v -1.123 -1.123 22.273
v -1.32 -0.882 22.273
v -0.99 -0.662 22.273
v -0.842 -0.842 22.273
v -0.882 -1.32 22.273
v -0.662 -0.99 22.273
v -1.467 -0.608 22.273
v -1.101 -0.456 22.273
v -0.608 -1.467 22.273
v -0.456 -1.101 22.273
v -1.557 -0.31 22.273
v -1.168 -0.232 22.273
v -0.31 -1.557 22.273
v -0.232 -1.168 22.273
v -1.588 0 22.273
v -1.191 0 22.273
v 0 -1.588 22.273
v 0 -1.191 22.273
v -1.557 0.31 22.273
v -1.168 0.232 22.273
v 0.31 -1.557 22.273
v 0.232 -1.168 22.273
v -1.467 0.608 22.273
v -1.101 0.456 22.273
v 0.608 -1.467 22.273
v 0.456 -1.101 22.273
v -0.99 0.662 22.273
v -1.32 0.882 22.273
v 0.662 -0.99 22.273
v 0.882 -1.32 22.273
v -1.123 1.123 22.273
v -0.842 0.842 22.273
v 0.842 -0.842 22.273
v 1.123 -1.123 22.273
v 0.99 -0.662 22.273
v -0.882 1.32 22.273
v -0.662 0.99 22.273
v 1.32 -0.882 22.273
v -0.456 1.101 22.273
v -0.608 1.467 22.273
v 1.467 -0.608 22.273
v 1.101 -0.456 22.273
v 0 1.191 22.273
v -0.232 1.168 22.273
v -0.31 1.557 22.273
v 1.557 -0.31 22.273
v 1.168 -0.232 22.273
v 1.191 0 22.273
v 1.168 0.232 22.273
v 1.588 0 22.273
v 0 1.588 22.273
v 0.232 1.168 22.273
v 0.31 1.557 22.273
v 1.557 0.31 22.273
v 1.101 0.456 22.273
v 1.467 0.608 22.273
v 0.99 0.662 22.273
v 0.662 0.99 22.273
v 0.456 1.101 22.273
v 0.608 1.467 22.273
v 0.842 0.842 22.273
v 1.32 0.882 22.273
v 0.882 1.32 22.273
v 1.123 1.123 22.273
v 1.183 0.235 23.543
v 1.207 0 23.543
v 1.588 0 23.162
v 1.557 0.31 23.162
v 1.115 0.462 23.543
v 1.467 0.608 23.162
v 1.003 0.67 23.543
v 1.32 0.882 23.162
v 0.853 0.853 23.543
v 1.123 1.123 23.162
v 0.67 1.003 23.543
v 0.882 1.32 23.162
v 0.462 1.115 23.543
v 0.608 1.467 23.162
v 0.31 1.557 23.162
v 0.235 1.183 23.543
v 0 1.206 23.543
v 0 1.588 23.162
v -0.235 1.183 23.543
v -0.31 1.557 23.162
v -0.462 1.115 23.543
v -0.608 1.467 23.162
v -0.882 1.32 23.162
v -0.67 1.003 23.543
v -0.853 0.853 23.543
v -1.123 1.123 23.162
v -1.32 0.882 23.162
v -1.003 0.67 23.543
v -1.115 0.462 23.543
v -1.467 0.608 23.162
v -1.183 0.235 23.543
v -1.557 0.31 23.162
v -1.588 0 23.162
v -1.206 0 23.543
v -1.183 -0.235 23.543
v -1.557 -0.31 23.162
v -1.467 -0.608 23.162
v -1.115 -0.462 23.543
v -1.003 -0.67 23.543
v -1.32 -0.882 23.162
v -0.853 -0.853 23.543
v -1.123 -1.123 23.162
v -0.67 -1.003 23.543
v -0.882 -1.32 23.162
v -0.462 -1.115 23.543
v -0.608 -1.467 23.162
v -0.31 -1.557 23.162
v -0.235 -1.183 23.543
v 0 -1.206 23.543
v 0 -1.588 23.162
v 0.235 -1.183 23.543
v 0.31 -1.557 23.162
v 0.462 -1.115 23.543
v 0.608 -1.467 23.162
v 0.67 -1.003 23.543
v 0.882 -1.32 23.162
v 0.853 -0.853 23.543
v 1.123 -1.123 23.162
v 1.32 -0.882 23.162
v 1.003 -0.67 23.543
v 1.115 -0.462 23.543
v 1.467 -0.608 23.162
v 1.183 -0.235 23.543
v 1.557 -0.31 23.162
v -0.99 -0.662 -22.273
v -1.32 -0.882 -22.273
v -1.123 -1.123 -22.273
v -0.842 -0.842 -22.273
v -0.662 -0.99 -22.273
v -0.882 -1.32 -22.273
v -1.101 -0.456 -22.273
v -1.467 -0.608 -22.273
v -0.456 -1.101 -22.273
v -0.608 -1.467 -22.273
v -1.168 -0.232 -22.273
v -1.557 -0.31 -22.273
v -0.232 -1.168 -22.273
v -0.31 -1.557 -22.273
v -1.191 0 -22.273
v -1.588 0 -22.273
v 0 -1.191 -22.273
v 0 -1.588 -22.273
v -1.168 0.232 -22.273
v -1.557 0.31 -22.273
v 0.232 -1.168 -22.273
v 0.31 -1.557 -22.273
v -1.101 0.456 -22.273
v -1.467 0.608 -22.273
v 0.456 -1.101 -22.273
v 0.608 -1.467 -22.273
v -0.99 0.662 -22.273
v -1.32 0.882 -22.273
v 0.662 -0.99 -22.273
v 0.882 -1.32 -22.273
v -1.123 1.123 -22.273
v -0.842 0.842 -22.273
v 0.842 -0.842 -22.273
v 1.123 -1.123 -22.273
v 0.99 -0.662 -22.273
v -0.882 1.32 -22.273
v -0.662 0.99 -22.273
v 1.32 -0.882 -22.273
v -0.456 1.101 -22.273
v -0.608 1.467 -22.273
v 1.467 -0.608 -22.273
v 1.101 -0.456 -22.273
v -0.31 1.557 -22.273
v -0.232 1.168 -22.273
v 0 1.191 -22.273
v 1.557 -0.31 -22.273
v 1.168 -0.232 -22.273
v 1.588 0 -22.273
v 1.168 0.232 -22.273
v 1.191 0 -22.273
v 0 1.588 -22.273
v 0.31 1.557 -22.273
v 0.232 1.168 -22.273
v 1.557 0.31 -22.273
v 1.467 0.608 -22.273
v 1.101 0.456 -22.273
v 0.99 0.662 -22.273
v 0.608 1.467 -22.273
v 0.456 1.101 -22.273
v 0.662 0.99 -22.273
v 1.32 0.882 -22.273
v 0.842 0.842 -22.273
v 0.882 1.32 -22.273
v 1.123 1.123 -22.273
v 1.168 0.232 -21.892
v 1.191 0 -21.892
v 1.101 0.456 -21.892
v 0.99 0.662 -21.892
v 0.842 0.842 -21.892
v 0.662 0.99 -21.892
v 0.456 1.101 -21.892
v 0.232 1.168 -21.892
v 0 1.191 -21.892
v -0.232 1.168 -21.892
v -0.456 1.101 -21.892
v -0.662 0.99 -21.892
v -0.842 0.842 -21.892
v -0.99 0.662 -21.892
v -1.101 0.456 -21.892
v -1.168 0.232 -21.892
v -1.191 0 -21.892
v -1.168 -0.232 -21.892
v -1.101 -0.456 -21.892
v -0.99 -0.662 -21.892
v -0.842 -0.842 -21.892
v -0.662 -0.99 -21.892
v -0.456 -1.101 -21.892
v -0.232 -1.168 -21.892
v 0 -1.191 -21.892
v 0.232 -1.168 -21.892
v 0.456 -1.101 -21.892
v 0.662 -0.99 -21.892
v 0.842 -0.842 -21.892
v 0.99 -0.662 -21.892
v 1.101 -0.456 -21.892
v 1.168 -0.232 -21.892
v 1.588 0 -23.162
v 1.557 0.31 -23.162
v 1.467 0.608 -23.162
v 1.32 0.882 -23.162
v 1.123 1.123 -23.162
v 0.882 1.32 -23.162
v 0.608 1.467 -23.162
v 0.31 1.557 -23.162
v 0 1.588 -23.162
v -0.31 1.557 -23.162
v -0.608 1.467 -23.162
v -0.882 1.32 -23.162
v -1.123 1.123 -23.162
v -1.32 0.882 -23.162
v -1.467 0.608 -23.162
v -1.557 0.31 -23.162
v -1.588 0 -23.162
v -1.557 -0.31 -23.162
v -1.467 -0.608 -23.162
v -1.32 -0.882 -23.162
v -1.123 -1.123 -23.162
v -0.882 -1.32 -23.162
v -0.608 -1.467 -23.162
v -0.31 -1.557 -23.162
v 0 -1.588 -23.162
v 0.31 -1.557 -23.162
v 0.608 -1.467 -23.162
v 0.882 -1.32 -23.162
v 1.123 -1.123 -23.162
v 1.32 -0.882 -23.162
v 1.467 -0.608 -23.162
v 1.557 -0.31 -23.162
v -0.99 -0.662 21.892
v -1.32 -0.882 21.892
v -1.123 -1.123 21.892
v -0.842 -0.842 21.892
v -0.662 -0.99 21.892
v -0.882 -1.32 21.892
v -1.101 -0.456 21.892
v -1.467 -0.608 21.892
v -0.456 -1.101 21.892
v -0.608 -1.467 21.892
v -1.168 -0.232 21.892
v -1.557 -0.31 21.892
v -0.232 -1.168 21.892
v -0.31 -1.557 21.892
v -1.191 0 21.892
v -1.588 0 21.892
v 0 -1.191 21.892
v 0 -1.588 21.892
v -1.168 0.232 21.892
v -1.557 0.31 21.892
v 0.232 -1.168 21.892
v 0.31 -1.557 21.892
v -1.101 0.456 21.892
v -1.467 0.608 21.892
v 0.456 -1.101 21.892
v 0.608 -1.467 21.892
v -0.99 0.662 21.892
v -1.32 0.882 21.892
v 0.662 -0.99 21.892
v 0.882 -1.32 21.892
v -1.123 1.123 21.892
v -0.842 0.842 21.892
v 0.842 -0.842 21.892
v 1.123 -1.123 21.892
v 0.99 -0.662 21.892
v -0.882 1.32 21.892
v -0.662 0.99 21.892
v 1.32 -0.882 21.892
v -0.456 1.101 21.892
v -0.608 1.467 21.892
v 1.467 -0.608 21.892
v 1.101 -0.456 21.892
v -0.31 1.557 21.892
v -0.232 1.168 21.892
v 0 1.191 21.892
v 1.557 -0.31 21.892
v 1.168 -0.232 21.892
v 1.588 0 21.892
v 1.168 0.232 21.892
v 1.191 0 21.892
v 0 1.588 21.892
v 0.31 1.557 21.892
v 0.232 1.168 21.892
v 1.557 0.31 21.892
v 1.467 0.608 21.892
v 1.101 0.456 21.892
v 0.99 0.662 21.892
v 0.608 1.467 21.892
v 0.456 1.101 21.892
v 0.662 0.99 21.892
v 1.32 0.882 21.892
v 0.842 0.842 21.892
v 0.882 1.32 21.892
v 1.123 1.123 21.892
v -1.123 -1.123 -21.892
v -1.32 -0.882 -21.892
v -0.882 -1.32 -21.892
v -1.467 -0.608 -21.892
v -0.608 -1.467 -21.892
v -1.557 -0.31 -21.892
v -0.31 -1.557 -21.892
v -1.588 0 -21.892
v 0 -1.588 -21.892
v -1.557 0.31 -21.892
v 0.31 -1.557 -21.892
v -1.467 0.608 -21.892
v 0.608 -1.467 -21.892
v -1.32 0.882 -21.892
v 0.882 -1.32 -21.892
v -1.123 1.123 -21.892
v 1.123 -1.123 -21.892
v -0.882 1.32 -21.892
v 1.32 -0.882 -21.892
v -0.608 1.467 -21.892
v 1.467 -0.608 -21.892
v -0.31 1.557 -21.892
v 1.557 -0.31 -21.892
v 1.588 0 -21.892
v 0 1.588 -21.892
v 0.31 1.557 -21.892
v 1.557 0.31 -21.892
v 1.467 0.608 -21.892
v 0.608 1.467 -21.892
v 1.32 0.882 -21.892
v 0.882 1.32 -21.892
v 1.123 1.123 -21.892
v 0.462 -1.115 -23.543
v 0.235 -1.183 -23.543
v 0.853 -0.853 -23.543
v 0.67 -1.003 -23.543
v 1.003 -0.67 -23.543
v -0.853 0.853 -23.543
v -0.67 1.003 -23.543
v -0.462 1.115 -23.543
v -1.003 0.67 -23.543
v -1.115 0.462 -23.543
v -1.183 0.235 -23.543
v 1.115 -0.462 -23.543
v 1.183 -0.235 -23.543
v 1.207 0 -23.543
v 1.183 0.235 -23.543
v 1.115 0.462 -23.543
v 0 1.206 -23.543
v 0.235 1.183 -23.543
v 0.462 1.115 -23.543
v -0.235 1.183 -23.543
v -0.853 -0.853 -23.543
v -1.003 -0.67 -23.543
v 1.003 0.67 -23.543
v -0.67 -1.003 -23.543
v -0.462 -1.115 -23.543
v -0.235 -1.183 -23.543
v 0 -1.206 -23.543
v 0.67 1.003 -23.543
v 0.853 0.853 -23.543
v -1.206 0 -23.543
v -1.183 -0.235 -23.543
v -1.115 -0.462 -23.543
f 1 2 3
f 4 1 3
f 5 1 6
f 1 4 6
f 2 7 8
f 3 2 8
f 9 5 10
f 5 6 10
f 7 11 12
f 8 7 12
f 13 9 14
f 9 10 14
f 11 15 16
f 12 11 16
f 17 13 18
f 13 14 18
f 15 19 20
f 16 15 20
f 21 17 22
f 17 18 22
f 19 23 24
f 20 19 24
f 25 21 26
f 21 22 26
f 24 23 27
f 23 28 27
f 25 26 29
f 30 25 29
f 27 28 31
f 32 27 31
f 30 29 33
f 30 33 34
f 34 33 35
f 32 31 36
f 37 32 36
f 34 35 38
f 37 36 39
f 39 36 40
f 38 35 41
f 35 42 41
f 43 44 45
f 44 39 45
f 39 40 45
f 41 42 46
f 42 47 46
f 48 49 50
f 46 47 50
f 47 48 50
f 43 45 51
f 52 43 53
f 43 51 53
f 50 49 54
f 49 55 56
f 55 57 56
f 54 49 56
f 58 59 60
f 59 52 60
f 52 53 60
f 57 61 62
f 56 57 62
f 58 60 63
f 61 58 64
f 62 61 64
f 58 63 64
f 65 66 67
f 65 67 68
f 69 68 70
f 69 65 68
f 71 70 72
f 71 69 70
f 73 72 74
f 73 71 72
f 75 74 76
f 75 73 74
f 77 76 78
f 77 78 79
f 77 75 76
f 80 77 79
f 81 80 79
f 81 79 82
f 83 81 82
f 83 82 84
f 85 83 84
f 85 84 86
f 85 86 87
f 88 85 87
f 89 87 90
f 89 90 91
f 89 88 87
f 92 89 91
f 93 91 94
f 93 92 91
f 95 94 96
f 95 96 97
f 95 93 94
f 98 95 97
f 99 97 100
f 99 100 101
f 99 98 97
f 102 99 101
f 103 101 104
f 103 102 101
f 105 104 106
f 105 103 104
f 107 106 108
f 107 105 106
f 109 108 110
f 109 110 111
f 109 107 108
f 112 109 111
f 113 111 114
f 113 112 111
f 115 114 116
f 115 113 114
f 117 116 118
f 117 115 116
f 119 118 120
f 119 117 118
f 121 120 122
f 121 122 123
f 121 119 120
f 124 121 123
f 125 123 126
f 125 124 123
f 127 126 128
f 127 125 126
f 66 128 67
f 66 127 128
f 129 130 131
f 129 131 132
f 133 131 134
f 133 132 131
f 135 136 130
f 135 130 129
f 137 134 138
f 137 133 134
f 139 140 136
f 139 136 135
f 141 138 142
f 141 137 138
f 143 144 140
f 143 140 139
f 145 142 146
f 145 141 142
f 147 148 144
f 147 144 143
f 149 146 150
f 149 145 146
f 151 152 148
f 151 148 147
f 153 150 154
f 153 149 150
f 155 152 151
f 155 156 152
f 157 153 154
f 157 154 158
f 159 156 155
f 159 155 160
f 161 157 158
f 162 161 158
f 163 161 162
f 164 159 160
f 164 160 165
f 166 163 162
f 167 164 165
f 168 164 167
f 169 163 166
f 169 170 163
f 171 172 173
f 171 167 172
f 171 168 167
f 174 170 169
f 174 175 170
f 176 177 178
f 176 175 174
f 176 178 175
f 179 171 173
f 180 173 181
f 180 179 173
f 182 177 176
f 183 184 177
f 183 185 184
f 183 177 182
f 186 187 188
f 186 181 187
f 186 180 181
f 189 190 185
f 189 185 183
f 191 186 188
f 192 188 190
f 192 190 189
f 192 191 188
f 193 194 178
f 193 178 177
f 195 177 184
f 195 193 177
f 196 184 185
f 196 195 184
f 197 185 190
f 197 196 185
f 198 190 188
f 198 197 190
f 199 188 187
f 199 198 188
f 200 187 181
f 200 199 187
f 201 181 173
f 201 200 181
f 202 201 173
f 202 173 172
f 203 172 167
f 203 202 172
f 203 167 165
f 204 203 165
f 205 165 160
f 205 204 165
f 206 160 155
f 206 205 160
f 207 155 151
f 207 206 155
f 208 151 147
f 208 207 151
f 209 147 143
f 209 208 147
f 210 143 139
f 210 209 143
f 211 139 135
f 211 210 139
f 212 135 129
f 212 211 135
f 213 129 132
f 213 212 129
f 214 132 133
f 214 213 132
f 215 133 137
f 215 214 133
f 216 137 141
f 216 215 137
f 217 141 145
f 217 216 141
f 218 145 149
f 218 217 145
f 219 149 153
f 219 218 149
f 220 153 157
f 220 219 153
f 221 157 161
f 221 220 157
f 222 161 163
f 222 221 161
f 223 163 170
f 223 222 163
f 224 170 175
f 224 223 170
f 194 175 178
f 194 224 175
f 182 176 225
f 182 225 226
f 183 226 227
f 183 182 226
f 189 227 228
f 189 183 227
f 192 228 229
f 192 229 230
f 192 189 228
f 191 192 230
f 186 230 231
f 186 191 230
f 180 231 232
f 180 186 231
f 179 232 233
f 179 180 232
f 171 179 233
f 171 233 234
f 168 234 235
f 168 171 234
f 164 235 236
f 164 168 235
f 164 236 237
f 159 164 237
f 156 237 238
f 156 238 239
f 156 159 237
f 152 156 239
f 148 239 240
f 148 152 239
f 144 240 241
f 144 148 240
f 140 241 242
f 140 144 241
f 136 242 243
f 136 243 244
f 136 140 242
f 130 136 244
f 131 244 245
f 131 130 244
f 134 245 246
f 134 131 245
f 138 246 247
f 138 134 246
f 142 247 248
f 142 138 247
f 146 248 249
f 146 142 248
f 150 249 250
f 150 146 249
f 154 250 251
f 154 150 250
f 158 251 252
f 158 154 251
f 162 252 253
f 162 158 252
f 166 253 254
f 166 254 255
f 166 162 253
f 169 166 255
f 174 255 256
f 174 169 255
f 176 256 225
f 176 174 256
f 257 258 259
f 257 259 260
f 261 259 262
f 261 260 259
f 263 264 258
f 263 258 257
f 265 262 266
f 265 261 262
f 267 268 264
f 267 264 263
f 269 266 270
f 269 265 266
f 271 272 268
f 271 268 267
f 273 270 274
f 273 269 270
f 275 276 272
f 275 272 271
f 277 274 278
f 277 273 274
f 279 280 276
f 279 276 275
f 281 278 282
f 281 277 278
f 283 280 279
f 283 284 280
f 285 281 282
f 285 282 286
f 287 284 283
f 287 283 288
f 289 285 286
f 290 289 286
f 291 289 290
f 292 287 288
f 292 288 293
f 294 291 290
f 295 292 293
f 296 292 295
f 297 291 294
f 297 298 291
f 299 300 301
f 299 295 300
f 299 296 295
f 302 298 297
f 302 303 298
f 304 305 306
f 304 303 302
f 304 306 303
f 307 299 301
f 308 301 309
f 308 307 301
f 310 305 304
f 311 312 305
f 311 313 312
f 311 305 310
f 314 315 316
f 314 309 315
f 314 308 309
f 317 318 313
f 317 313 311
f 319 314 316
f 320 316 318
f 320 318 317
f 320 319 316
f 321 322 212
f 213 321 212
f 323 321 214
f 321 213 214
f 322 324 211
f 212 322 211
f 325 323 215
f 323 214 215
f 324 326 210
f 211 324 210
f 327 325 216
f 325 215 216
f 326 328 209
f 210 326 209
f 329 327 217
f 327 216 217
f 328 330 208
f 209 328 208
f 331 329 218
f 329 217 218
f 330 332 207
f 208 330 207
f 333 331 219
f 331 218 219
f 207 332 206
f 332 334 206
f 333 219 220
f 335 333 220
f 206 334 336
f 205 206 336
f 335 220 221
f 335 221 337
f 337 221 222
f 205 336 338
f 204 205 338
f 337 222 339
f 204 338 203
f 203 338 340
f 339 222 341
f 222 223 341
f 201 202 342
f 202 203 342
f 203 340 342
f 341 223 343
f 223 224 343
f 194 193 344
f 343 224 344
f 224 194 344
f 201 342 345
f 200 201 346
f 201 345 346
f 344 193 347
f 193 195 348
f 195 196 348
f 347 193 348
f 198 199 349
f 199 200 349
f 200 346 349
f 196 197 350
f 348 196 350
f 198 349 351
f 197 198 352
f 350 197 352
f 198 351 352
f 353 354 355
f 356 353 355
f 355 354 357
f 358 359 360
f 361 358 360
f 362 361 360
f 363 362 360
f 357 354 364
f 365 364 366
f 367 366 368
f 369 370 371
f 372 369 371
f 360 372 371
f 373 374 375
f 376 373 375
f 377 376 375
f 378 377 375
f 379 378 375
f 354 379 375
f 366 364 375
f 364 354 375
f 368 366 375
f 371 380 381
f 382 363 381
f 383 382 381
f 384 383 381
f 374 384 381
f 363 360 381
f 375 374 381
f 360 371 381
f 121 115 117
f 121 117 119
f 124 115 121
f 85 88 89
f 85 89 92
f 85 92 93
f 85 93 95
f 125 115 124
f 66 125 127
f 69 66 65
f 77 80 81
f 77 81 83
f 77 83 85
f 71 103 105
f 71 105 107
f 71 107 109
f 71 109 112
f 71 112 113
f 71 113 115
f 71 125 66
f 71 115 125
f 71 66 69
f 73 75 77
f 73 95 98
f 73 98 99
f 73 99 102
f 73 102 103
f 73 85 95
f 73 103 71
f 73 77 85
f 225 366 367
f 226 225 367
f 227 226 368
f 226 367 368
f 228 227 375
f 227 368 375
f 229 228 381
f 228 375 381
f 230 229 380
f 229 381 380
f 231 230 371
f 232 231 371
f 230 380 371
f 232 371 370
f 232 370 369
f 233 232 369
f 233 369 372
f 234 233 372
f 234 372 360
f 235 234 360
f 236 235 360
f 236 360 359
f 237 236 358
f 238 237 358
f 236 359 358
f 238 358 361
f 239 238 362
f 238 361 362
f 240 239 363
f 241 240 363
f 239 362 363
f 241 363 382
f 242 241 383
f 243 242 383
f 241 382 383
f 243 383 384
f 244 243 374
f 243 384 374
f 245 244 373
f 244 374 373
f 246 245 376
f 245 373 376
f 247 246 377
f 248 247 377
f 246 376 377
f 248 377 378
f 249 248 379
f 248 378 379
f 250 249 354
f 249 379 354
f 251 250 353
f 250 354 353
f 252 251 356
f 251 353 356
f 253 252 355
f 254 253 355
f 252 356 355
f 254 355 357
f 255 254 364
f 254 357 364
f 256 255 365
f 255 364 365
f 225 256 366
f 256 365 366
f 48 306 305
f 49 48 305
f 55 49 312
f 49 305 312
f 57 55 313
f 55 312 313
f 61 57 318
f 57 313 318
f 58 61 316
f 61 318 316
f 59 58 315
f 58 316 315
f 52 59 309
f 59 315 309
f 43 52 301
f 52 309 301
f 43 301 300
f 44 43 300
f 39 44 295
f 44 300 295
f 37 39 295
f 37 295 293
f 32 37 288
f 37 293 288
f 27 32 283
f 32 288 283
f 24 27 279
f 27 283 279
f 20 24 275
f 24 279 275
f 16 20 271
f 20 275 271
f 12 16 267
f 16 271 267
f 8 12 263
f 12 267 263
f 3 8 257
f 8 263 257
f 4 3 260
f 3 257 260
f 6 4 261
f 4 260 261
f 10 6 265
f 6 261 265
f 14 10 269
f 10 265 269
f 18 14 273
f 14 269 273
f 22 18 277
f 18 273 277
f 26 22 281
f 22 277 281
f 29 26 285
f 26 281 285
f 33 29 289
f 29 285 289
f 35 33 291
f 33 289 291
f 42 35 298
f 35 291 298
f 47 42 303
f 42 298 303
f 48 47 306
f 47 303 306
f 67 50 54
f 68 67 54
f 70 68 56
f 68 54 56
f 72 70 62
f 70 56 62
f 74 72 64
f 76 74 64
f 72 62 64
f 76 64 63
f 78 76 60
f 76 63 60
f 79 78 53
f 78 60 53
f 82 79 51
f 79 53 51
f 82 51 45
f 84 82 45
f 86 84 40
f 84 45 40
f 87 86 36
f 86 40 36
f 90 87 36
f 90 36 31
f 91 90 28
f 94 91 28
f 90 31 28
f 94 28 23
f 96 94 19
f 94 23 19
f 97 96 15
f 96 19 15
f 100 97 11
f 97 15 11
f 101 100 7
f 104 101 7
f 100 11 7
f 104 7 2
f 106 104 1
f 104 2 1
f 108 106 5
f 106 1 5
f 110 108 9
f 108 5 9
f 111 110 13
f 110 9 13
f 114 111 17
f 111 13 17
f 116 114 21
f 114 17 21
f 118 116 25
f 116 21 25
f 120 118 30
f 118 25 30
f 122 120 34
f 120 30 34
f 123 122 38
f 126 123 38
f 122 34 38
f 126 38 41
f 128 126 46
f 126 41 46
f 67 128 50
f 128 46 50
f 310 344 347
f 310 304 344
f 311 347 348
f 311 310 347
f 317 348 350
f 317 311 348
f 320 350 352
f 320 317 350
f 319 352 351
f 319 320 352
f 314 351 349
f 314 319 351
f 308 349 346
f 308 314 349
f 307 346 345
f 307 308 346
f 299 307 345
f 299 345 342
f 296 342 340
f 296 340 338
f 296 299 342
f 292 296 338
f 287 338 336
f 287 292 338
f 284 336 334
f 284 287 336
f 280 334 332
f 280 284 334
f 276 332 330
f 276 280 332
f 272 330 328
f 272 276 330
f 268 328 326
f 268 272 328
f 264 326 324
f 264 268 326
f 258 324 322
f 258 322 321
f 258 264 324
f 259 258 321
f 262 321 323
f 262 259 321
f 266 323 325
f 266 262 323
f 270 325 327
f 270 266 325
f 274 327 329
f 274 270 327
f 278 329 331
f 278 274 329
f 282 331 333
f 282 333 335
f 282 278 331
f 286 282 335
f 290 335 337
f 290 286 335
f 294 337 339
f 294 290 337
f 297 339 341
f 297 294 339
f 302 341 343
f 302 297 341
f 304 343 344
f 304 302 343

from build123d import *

# Parameters (mm, degrees)
SKETCH1_R                = 1.5875
BOSS_EXTRUDE1_DEPTH      = 21.89226
SKETCH2_R                = 1.19126
BOSS_EXTRUDE2_DEPTH      = 0.381
SKETCH3_R                = 1.5875
BOSS_EXTRUDE3_DEPTH      = 1.27
CHAMFER1_SIZE            = 0.381
CHAMFER1_OF_MIRROR1_SIZE = 0.381


with BuildPart() as part:
    # Sketch1 → Boss-Extrude1 (new body, symmetric)
    with BuildSketch(Plane.XY):
        Circle(SKETCH1_R)
    extrude(amount=BOSS_EXTRUDE1_DEPTH, both=True)

    # Sketch2 → Boss-Extrude2 (add)
    with BuildSketch(Plane.XY.offset(21.89226)):
        Circle(SKETCH2_R)
    boss_extrude2 = extrude(amount=BOSS_EXTRUDE2_DEPTH)

    # Sketch3 → Boss-Extrude3 (add)
    with BuildSketch(Plane.XY.offset(22.27326)):
        Circle(SKETCH3_R)
    boss_extrude3 = extrude(amount=BOSS_EXTRUDE3_DEPTH)

    # Chamfer1
    chamfer1_edges = [part.edges().sort_by_distance(p)[0] for p in [
        (-1.5875, 0, 23.54326),
    ]]
    chamfer(chamfer1_edges, length=CHAMFER1_SIZE)

    # Mirror1: Boss-Extrude2, Boss-Extrude3 across plane
    add(boss_extrude2.mirror(Plane.XY))
    add(boss_extrude3.mirror(Plane.XY))

    # Chamfer1 of Mirror1
    chamfer1_of_mirror1_edges = [part.edges().sort_by_distance(p)[0] for p in [
        (-1.5875, 0, -23.54326),
    ]]
    chamfer(chamfer1_of_mirror1_edges, length=CHAMFER1_OF_MIRROR1_SIZE)


solid = part.part
